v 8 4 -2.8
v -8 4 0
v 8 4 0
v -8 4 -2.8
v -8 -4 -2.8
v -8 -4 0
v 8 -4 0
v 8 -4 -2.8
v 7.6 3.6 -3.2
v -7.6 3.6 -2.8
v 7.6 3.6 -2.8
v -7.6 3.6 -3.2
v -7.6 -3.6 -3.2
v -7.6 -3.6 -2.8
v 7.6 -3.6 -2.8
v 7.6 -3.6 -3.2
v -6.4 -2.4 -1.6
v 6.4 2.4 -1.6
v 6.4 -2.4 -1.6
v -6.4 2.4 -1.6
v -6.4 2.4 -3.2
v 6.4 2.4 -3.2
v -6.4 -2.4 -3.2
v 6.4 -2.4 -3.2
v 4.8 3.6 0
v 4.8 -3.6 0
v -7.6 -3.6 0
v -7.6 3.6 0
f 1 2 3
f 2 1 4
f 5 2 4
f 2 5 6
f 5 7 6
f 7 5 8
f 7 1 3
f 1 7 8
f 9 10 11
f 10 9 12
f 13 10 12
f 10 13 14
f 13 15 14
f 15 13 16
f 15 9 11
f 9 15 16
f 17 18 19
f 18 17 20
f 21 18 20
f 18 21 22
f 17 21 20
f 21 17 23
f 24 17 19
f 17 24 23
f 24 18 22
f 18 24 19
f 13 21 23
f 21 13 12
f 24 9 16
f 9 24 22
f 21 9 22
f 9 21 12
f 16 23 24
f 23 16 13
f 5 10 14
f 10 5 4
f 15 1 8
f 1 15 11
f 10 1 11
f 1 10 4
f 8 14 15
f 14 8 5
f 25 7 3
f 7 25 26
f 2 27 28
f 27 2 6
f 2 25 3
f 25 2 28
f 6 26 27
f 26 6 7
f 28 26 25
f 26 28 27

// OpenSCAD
// file: ../p/box5.scad
use <../lib.scad>
function ldraw_lib__box5() = [
// 0 Box with 5 Faces and All Edges
// 0 Name: box5.dat
// 0 Author: James Jessiman
// 0 !LDRAW_ORG Primitive UPDATE 2012-01
// 0 !LICENSE Licensed under CC BY 2.0 and CC BY 4.0 : see CAreadme.txt
// 
// 0 BFC CERTIFY CCW
  [0,"BFC","CERTIFY"],
  [0,"BFC","CCW"],
// 
// 0 !HISTORY 2002-04-03 [sbliss] Modified for BFC compliance
// 0 !HISTORY 2002-04-25 [PTadmin] Official Update 2002-02
// 0 !HISTORY 2007-06-24 [PTadmin] Header formatted for Contributor Agreement
// 0 !HISTORY 2008-07-01 [PTadmin] Official Update 2008-01
// 0 !HISTORY 2012-02-16 [Philo] Changed to CCW
// 0 !HISTORY 2012-03-30 [PTadmin] Official Update 2012-01
// 
// 
// 2 24 1 1 1 -1 1 1
  [2,24,1,1,1,-1,1,1],
// 2 24 -1 1 1 -1 1 -1
  [2,24,-1,1,1,-1,1,-1],
// 2 24 -1 1 -1 1 1 -1
  [2,24,-1,1,-1,1,1,-1],
// 2 24 1 1 -1 1 1 1
  [2,24,1,1,-1,1,1,1],
// 2 24 1 0 1 -1 0 1
  [2,24,1,0,1,-1,0,1],
// 2 24 -1 0 1 -1 0 -1
  [2,24,-1,0,1,-1,0,-1],
// 2 24 -1 0 -1 1 0 -1
  [2,24,-1,0,-1,1,0,-1],
// 2 24 1 0 -1 1 0 1
  [2,24,1,0,-1,1,0,1],
// 2 24 1 0 1 1 1 1
  [2,24,1,0,1,1,1,1],
// 2 24 -1 0 1 -1 1 1
  [2,24,-1,0,1,-1,1,1],
// 2 24 1 0 -1 1 1 -1
  [2,24,1,0,-1,1,1,-1],
// 2 24 -1 0 -1 -1 1 -1
  [2,24,-1,0,-1,-1,1,-1],
// 4 16 -1 1 1 1 1 1 1 1 -1 -1 1 -1
  [4,16,-1,1,1,1,1,1,1,1,-1,-1,1,-1],
// 4 16 -1 1 1 -1 0 1 1 0 1 1 1 1
  [4,16,-1,1,1,-1,0,1,1,0,1,1,1,1],
// 4 16 -1 1 -1 -1 0 -1 -1 0 1 -1 1 1
  [4,16,-1,1,-1,-1,0,-1,-1,0,1,-1,1,1],
// 4 16 1 1 -1 1 0 -1 -1 0 -1 -1 1 -1
  [4,16,1,1,-1,1,0,-1,-1,0,-1,-1,1,-1],
// 4 16 1 1 1 1 0 1 1 0 -1 1 1 -1
  [4,16,1,1,1,1,0,1,1,0,-1,1,1,-1],
];
module ldraw_lib__box5(step=0, col=false, unit=2/5, alt=false, line=0.2, solid=!$preview)
    makepoly(ldraw_lib__box5(), step=step, col=col, unit=unit, alt=alt, line=line, solid=solid);
ldraw_lib__box5(line=0.2);
// file: ../p/box4.scad
use <../lib.scad>
function ldraw_lib__box4() = [
// 0 Box with 4 Faces (2 Parallel Pairs) and All Edges
// 0 Name: box4.dat
// 0 Author: James Jessiman
// 0 !LDRAW_ORG Primitive UPDATE 2012-01
// 0 !LICENSE Licensed under CC BY 2.0 and CC BY 4.0 : see CAreadme.txt
// 
// 0 BFC CERTIFY CCW
  [0,"BFC","CERTIFY"],
  [0,"BFC","CCW"],
// 
// 0 !HISTORY 2002-04-03 [sbliss] Modified for BFC compliance
// 0 !HISTORY 2002-04-25 [PTadmin] Official Update 2002-02
// 0 !HISTORY 2007-06-24 [PTadmin] Header formatted for Contributor Agreement
// 0 !HISTORY 2008-07-01 [PTadmin] Official Update 2008-01
// 0 !HISTORY 2012-02-16 [Philo] Changed to CCW
// 0 !HISTORY 2012-03-30 [PTadmin] Official Update 2012-01
// 
// 
// 2 24 1 1 1 -1 1 1
  [2,24,1,1,1,-1,1,1],
// 2 24 -1 1 1 -1 1 -1
  [2,24,-1,1,1,-1,1,-1],
// 2 24 -1 1 -1 1 1 -1
  [2,24,-1,1,-1,1,1,-1],
// 2 24 1 1 -1 1 1 1
  [2,24,1,1,-1,1,1,1],
// 2 24 1 0 1 -1 0 1
  [2,24,1,0,1,-1,0,1],
// 2 24 -1 0 1 -1 0 -1
  [2,24,-1,0,1,-1,0,-1],
// 2 24 -1 0 -1 1 0 -1
  [2,24,-1,0,-1,1,0,-1],
// 2 24 1 0 -1 1 0 1
  [2,24,1,0,-1,1,0,1],
// 2 24 1 0 1 1 1 1
  [2,24,1,0,1,1,1,1],
// 2 24 -1 0 1 -1 1 1
  [2,24,-1,0,1,-1,1,1],
// 2 24 1 0 -1 1 1 -1
  [2,24,1,0,-1,1,1,-1],
// 2 24 -1 0 -1 -1 1 -1
  [2,24,-1,0,-1,-1,1,-1],
// 4 16 -1 1 1 -1 0 1 1 0 1 1 1 1
  [4,16,-1,1,1,-1,0,1,1,0,1,1,1,1],
// 4 16 -1 1 -1 -1 0 -1 -1 0 1 -1 1 1
  [4,16,-1,1,-1,-1,0,-1,-1,0,1,-1,1,1],
// 4 16 1 1 -1 1 0 -1 -1 0 -1 -1 1 -1
  [4,16,1,1,-1,1,0,-1,-1,0,-1,-1,1,-1],
// 4 16 1 1 1 1 0 1 1 0 -1 1 1 -1
  [4,16,1,1,1,1,0,1,1,0,-1,1,1,-1],
];
module ldraw_lib__box4(step=0, col=false, unit=2/5, alt=false, line=0.2, solid=!$preview)
    makepoly(ldraw_lib__box4(), step=step, col=col, unit=unit, alt=alt, line=line, solid=solid);
ldraw_lib__box4(line=0.2);
// file: s/3069bs01.scad
use <../../lib.scad>
use <../../p/box4.scad>
use <../../p/box5.scad>
function ldraw_lib__s__3069bs01() = [
// 0 ~Tile  1 x  2 with Groove without Top Face
// 0 Name: s\3069bs01.dat
// 0 Author: Santeri Piippo [arezey]
// 0 !LDRAW_ORG Subpart UPDATE 2010-02
// 0 !LICENSE Licensed under CC BY 2.0 and CC BY 4.0 : see CAreadme.txt
// 
// 0 BFC CERTIFY CCW
  [0,"BFC","CERTIFY"],
  [0,"BFC","CCW"],
// 
// 0 !HISTORY 2010-07-05 [PTadmin] Official Update 2010-02
// 
// 
// 1 16 0 0 0 20 0 0 0 7 0 0 0 10 box4.dat
  [1,16,0,0,0,20,0,0,0,7,0,0,0,10, ldraw_lib__box4()],
// 1 16 0 7 0 19 0 0 0 1 0 0 0 9 box4.dat
  [1,16,0,7,0,19,0,0,0,1,0,0,0,9, ldraw_lib__box4()],
// 0 BFC INVERTNEXT
  [0,"BFC","INVERTNEXT"],
// 1 16 0 8 0 16 0 0 0 -4 0 0 0 6 box5.dat
  [1,16,0,8,0,16,0,0,0,-4,0,0,0,6, ldraw_lib__box5()],
// 4 16 -19 8 9 -16 8 6 -16 8 -6 -19 8 -9
  [4,16,-19,8,9,-16,8,6,-16,8,-6,-19,8,-9],
// 4 16 19 8 -9 16 8 -6 16 8 6 19 8 9
  [4,16,19,8,-9,16,8,-6,16,8,6,19,8,9],
// 4 16 19 8 9 16 8 6 -16 8 6 -19 8 9
  [4,16,19,8,9,16,8,6,-16,8,6,-19,8,9],
// 4 16 -19 8 -9 -16 8 -6 16 8 -6 19 8 -9
  [4,16,-19,8,-9,-16,8,-6,16,8,-6,19,8,-9],
// 4 16 -20 7 10 -19 7 9 -19 7 -9 -20 7 -10
  [4,16,-20,7,10,-19,7,9,-19,7,-9,-20,7,-10],
// 4 16 20 7 -10 19 7 -9 19 7 9 20 7 10
  [4,16,20,7,-10,19,7,-9,19,7,9,20,7,10],
// 4 16 20 7 10 19 7 9 -19 7 9 -20 7 10
  [4,16,20,7,10,19,7,9,-19,7,9,-20,7,10],
// 4 16 -20 7 -10 -19 7 -9 19 7 -9 20 7 -10
  [4,16,-20,7,-10,-19,7,-9,19,7,-9,20,7,-10],
// 0 //
];
module ldraw_lib__s__3069bs01(step=0, col=false, unit=2/5, alt=false, line=0.2, solid=!$preview)
    makepoly(ldraw_lib__s__3069bs01(), step=step, col=col, unit=unit, alt=alt, line=line, solid=solid);
ldraw_lib__s__3069bs01(line=0.2);
// main file
use <../lib.scad>
use <s/3069bs01.scad>
function ldraw_lib__3069bpx9() = [
// 0 Tile  1 x  2 with Groove with Red Rectangle Pattern
// 0 Name: 3069bpx9.dat
// 0 Author: Ulrich Röder [UR]
// 0 !LDRAW_ORG Part UPDATE 2022-01
// 0 !LICENSE Licensed under CC BY 2.0 and CC BY 4.0 : see CAreadme.txt
// 
// 0 BFC CERTIFY CCW
  [0,"BFC","CERTIFY"],
  [0,"BFC","CCW"],
// 
// 0 !KEYWORDS Bricklink 3069bpb908, Porsche, Set 10295, Year 2021
// 
// 0 !CMDLINE -c47
// 
// 0 !HISTORY 2022-01-14 [PTadmin] Official Update 2022-01
// 
// 
// 1 16 0 0 0 1 0 0 0 1 0 0 0 1 s\3069bs01.dat
  [1,16,0,0,0,1,0,0,0,1,0,0,0,1, ldraw_lib__s__3069bs01()],
// 4 16 20 0 10 12 0 9 12 0 -9 20 0 -10
  [4,16,20,0,10,12,0,9,12,0,-9,20,0,-10],
// 4 16 -20 0 10 -20 0 -10 -19 0 -9 -19 0 9
  [4,16,-20,0,10,-20,0,-10,-19,0,-9,-19,0,9],
// 4 16 -20 0 10 -19 0 9 12 0 9 20 0 10
  [4,16,-20,0,10,-19,0,9,12,0,9,20,0,10],
// 4 16 12 0 -9 -19 0 -9 -20 0 -10 20 0 -10
  [4,16,12,0,-9,-19,0,-9,-20,0,-10,20,0,-10],
// 4 4 12 0 -9 12 0 9 -19 0 9 -19 0 -9
  [4,4,12,0,-9,12,0,9,-19,0,9,-19,0,-9],
];
module ldraw_lib__3069bpx9(step=0, col=false, unit=2/5, alt=false, line=0.2, solid=!$preview)
    makepoly(ldraw_lib__3069bpx9(), step=step, col=col, unit=unit, alt=alt, line=line, solid=solid);
ldraw_lib__3069bpx9(line=0.2);
